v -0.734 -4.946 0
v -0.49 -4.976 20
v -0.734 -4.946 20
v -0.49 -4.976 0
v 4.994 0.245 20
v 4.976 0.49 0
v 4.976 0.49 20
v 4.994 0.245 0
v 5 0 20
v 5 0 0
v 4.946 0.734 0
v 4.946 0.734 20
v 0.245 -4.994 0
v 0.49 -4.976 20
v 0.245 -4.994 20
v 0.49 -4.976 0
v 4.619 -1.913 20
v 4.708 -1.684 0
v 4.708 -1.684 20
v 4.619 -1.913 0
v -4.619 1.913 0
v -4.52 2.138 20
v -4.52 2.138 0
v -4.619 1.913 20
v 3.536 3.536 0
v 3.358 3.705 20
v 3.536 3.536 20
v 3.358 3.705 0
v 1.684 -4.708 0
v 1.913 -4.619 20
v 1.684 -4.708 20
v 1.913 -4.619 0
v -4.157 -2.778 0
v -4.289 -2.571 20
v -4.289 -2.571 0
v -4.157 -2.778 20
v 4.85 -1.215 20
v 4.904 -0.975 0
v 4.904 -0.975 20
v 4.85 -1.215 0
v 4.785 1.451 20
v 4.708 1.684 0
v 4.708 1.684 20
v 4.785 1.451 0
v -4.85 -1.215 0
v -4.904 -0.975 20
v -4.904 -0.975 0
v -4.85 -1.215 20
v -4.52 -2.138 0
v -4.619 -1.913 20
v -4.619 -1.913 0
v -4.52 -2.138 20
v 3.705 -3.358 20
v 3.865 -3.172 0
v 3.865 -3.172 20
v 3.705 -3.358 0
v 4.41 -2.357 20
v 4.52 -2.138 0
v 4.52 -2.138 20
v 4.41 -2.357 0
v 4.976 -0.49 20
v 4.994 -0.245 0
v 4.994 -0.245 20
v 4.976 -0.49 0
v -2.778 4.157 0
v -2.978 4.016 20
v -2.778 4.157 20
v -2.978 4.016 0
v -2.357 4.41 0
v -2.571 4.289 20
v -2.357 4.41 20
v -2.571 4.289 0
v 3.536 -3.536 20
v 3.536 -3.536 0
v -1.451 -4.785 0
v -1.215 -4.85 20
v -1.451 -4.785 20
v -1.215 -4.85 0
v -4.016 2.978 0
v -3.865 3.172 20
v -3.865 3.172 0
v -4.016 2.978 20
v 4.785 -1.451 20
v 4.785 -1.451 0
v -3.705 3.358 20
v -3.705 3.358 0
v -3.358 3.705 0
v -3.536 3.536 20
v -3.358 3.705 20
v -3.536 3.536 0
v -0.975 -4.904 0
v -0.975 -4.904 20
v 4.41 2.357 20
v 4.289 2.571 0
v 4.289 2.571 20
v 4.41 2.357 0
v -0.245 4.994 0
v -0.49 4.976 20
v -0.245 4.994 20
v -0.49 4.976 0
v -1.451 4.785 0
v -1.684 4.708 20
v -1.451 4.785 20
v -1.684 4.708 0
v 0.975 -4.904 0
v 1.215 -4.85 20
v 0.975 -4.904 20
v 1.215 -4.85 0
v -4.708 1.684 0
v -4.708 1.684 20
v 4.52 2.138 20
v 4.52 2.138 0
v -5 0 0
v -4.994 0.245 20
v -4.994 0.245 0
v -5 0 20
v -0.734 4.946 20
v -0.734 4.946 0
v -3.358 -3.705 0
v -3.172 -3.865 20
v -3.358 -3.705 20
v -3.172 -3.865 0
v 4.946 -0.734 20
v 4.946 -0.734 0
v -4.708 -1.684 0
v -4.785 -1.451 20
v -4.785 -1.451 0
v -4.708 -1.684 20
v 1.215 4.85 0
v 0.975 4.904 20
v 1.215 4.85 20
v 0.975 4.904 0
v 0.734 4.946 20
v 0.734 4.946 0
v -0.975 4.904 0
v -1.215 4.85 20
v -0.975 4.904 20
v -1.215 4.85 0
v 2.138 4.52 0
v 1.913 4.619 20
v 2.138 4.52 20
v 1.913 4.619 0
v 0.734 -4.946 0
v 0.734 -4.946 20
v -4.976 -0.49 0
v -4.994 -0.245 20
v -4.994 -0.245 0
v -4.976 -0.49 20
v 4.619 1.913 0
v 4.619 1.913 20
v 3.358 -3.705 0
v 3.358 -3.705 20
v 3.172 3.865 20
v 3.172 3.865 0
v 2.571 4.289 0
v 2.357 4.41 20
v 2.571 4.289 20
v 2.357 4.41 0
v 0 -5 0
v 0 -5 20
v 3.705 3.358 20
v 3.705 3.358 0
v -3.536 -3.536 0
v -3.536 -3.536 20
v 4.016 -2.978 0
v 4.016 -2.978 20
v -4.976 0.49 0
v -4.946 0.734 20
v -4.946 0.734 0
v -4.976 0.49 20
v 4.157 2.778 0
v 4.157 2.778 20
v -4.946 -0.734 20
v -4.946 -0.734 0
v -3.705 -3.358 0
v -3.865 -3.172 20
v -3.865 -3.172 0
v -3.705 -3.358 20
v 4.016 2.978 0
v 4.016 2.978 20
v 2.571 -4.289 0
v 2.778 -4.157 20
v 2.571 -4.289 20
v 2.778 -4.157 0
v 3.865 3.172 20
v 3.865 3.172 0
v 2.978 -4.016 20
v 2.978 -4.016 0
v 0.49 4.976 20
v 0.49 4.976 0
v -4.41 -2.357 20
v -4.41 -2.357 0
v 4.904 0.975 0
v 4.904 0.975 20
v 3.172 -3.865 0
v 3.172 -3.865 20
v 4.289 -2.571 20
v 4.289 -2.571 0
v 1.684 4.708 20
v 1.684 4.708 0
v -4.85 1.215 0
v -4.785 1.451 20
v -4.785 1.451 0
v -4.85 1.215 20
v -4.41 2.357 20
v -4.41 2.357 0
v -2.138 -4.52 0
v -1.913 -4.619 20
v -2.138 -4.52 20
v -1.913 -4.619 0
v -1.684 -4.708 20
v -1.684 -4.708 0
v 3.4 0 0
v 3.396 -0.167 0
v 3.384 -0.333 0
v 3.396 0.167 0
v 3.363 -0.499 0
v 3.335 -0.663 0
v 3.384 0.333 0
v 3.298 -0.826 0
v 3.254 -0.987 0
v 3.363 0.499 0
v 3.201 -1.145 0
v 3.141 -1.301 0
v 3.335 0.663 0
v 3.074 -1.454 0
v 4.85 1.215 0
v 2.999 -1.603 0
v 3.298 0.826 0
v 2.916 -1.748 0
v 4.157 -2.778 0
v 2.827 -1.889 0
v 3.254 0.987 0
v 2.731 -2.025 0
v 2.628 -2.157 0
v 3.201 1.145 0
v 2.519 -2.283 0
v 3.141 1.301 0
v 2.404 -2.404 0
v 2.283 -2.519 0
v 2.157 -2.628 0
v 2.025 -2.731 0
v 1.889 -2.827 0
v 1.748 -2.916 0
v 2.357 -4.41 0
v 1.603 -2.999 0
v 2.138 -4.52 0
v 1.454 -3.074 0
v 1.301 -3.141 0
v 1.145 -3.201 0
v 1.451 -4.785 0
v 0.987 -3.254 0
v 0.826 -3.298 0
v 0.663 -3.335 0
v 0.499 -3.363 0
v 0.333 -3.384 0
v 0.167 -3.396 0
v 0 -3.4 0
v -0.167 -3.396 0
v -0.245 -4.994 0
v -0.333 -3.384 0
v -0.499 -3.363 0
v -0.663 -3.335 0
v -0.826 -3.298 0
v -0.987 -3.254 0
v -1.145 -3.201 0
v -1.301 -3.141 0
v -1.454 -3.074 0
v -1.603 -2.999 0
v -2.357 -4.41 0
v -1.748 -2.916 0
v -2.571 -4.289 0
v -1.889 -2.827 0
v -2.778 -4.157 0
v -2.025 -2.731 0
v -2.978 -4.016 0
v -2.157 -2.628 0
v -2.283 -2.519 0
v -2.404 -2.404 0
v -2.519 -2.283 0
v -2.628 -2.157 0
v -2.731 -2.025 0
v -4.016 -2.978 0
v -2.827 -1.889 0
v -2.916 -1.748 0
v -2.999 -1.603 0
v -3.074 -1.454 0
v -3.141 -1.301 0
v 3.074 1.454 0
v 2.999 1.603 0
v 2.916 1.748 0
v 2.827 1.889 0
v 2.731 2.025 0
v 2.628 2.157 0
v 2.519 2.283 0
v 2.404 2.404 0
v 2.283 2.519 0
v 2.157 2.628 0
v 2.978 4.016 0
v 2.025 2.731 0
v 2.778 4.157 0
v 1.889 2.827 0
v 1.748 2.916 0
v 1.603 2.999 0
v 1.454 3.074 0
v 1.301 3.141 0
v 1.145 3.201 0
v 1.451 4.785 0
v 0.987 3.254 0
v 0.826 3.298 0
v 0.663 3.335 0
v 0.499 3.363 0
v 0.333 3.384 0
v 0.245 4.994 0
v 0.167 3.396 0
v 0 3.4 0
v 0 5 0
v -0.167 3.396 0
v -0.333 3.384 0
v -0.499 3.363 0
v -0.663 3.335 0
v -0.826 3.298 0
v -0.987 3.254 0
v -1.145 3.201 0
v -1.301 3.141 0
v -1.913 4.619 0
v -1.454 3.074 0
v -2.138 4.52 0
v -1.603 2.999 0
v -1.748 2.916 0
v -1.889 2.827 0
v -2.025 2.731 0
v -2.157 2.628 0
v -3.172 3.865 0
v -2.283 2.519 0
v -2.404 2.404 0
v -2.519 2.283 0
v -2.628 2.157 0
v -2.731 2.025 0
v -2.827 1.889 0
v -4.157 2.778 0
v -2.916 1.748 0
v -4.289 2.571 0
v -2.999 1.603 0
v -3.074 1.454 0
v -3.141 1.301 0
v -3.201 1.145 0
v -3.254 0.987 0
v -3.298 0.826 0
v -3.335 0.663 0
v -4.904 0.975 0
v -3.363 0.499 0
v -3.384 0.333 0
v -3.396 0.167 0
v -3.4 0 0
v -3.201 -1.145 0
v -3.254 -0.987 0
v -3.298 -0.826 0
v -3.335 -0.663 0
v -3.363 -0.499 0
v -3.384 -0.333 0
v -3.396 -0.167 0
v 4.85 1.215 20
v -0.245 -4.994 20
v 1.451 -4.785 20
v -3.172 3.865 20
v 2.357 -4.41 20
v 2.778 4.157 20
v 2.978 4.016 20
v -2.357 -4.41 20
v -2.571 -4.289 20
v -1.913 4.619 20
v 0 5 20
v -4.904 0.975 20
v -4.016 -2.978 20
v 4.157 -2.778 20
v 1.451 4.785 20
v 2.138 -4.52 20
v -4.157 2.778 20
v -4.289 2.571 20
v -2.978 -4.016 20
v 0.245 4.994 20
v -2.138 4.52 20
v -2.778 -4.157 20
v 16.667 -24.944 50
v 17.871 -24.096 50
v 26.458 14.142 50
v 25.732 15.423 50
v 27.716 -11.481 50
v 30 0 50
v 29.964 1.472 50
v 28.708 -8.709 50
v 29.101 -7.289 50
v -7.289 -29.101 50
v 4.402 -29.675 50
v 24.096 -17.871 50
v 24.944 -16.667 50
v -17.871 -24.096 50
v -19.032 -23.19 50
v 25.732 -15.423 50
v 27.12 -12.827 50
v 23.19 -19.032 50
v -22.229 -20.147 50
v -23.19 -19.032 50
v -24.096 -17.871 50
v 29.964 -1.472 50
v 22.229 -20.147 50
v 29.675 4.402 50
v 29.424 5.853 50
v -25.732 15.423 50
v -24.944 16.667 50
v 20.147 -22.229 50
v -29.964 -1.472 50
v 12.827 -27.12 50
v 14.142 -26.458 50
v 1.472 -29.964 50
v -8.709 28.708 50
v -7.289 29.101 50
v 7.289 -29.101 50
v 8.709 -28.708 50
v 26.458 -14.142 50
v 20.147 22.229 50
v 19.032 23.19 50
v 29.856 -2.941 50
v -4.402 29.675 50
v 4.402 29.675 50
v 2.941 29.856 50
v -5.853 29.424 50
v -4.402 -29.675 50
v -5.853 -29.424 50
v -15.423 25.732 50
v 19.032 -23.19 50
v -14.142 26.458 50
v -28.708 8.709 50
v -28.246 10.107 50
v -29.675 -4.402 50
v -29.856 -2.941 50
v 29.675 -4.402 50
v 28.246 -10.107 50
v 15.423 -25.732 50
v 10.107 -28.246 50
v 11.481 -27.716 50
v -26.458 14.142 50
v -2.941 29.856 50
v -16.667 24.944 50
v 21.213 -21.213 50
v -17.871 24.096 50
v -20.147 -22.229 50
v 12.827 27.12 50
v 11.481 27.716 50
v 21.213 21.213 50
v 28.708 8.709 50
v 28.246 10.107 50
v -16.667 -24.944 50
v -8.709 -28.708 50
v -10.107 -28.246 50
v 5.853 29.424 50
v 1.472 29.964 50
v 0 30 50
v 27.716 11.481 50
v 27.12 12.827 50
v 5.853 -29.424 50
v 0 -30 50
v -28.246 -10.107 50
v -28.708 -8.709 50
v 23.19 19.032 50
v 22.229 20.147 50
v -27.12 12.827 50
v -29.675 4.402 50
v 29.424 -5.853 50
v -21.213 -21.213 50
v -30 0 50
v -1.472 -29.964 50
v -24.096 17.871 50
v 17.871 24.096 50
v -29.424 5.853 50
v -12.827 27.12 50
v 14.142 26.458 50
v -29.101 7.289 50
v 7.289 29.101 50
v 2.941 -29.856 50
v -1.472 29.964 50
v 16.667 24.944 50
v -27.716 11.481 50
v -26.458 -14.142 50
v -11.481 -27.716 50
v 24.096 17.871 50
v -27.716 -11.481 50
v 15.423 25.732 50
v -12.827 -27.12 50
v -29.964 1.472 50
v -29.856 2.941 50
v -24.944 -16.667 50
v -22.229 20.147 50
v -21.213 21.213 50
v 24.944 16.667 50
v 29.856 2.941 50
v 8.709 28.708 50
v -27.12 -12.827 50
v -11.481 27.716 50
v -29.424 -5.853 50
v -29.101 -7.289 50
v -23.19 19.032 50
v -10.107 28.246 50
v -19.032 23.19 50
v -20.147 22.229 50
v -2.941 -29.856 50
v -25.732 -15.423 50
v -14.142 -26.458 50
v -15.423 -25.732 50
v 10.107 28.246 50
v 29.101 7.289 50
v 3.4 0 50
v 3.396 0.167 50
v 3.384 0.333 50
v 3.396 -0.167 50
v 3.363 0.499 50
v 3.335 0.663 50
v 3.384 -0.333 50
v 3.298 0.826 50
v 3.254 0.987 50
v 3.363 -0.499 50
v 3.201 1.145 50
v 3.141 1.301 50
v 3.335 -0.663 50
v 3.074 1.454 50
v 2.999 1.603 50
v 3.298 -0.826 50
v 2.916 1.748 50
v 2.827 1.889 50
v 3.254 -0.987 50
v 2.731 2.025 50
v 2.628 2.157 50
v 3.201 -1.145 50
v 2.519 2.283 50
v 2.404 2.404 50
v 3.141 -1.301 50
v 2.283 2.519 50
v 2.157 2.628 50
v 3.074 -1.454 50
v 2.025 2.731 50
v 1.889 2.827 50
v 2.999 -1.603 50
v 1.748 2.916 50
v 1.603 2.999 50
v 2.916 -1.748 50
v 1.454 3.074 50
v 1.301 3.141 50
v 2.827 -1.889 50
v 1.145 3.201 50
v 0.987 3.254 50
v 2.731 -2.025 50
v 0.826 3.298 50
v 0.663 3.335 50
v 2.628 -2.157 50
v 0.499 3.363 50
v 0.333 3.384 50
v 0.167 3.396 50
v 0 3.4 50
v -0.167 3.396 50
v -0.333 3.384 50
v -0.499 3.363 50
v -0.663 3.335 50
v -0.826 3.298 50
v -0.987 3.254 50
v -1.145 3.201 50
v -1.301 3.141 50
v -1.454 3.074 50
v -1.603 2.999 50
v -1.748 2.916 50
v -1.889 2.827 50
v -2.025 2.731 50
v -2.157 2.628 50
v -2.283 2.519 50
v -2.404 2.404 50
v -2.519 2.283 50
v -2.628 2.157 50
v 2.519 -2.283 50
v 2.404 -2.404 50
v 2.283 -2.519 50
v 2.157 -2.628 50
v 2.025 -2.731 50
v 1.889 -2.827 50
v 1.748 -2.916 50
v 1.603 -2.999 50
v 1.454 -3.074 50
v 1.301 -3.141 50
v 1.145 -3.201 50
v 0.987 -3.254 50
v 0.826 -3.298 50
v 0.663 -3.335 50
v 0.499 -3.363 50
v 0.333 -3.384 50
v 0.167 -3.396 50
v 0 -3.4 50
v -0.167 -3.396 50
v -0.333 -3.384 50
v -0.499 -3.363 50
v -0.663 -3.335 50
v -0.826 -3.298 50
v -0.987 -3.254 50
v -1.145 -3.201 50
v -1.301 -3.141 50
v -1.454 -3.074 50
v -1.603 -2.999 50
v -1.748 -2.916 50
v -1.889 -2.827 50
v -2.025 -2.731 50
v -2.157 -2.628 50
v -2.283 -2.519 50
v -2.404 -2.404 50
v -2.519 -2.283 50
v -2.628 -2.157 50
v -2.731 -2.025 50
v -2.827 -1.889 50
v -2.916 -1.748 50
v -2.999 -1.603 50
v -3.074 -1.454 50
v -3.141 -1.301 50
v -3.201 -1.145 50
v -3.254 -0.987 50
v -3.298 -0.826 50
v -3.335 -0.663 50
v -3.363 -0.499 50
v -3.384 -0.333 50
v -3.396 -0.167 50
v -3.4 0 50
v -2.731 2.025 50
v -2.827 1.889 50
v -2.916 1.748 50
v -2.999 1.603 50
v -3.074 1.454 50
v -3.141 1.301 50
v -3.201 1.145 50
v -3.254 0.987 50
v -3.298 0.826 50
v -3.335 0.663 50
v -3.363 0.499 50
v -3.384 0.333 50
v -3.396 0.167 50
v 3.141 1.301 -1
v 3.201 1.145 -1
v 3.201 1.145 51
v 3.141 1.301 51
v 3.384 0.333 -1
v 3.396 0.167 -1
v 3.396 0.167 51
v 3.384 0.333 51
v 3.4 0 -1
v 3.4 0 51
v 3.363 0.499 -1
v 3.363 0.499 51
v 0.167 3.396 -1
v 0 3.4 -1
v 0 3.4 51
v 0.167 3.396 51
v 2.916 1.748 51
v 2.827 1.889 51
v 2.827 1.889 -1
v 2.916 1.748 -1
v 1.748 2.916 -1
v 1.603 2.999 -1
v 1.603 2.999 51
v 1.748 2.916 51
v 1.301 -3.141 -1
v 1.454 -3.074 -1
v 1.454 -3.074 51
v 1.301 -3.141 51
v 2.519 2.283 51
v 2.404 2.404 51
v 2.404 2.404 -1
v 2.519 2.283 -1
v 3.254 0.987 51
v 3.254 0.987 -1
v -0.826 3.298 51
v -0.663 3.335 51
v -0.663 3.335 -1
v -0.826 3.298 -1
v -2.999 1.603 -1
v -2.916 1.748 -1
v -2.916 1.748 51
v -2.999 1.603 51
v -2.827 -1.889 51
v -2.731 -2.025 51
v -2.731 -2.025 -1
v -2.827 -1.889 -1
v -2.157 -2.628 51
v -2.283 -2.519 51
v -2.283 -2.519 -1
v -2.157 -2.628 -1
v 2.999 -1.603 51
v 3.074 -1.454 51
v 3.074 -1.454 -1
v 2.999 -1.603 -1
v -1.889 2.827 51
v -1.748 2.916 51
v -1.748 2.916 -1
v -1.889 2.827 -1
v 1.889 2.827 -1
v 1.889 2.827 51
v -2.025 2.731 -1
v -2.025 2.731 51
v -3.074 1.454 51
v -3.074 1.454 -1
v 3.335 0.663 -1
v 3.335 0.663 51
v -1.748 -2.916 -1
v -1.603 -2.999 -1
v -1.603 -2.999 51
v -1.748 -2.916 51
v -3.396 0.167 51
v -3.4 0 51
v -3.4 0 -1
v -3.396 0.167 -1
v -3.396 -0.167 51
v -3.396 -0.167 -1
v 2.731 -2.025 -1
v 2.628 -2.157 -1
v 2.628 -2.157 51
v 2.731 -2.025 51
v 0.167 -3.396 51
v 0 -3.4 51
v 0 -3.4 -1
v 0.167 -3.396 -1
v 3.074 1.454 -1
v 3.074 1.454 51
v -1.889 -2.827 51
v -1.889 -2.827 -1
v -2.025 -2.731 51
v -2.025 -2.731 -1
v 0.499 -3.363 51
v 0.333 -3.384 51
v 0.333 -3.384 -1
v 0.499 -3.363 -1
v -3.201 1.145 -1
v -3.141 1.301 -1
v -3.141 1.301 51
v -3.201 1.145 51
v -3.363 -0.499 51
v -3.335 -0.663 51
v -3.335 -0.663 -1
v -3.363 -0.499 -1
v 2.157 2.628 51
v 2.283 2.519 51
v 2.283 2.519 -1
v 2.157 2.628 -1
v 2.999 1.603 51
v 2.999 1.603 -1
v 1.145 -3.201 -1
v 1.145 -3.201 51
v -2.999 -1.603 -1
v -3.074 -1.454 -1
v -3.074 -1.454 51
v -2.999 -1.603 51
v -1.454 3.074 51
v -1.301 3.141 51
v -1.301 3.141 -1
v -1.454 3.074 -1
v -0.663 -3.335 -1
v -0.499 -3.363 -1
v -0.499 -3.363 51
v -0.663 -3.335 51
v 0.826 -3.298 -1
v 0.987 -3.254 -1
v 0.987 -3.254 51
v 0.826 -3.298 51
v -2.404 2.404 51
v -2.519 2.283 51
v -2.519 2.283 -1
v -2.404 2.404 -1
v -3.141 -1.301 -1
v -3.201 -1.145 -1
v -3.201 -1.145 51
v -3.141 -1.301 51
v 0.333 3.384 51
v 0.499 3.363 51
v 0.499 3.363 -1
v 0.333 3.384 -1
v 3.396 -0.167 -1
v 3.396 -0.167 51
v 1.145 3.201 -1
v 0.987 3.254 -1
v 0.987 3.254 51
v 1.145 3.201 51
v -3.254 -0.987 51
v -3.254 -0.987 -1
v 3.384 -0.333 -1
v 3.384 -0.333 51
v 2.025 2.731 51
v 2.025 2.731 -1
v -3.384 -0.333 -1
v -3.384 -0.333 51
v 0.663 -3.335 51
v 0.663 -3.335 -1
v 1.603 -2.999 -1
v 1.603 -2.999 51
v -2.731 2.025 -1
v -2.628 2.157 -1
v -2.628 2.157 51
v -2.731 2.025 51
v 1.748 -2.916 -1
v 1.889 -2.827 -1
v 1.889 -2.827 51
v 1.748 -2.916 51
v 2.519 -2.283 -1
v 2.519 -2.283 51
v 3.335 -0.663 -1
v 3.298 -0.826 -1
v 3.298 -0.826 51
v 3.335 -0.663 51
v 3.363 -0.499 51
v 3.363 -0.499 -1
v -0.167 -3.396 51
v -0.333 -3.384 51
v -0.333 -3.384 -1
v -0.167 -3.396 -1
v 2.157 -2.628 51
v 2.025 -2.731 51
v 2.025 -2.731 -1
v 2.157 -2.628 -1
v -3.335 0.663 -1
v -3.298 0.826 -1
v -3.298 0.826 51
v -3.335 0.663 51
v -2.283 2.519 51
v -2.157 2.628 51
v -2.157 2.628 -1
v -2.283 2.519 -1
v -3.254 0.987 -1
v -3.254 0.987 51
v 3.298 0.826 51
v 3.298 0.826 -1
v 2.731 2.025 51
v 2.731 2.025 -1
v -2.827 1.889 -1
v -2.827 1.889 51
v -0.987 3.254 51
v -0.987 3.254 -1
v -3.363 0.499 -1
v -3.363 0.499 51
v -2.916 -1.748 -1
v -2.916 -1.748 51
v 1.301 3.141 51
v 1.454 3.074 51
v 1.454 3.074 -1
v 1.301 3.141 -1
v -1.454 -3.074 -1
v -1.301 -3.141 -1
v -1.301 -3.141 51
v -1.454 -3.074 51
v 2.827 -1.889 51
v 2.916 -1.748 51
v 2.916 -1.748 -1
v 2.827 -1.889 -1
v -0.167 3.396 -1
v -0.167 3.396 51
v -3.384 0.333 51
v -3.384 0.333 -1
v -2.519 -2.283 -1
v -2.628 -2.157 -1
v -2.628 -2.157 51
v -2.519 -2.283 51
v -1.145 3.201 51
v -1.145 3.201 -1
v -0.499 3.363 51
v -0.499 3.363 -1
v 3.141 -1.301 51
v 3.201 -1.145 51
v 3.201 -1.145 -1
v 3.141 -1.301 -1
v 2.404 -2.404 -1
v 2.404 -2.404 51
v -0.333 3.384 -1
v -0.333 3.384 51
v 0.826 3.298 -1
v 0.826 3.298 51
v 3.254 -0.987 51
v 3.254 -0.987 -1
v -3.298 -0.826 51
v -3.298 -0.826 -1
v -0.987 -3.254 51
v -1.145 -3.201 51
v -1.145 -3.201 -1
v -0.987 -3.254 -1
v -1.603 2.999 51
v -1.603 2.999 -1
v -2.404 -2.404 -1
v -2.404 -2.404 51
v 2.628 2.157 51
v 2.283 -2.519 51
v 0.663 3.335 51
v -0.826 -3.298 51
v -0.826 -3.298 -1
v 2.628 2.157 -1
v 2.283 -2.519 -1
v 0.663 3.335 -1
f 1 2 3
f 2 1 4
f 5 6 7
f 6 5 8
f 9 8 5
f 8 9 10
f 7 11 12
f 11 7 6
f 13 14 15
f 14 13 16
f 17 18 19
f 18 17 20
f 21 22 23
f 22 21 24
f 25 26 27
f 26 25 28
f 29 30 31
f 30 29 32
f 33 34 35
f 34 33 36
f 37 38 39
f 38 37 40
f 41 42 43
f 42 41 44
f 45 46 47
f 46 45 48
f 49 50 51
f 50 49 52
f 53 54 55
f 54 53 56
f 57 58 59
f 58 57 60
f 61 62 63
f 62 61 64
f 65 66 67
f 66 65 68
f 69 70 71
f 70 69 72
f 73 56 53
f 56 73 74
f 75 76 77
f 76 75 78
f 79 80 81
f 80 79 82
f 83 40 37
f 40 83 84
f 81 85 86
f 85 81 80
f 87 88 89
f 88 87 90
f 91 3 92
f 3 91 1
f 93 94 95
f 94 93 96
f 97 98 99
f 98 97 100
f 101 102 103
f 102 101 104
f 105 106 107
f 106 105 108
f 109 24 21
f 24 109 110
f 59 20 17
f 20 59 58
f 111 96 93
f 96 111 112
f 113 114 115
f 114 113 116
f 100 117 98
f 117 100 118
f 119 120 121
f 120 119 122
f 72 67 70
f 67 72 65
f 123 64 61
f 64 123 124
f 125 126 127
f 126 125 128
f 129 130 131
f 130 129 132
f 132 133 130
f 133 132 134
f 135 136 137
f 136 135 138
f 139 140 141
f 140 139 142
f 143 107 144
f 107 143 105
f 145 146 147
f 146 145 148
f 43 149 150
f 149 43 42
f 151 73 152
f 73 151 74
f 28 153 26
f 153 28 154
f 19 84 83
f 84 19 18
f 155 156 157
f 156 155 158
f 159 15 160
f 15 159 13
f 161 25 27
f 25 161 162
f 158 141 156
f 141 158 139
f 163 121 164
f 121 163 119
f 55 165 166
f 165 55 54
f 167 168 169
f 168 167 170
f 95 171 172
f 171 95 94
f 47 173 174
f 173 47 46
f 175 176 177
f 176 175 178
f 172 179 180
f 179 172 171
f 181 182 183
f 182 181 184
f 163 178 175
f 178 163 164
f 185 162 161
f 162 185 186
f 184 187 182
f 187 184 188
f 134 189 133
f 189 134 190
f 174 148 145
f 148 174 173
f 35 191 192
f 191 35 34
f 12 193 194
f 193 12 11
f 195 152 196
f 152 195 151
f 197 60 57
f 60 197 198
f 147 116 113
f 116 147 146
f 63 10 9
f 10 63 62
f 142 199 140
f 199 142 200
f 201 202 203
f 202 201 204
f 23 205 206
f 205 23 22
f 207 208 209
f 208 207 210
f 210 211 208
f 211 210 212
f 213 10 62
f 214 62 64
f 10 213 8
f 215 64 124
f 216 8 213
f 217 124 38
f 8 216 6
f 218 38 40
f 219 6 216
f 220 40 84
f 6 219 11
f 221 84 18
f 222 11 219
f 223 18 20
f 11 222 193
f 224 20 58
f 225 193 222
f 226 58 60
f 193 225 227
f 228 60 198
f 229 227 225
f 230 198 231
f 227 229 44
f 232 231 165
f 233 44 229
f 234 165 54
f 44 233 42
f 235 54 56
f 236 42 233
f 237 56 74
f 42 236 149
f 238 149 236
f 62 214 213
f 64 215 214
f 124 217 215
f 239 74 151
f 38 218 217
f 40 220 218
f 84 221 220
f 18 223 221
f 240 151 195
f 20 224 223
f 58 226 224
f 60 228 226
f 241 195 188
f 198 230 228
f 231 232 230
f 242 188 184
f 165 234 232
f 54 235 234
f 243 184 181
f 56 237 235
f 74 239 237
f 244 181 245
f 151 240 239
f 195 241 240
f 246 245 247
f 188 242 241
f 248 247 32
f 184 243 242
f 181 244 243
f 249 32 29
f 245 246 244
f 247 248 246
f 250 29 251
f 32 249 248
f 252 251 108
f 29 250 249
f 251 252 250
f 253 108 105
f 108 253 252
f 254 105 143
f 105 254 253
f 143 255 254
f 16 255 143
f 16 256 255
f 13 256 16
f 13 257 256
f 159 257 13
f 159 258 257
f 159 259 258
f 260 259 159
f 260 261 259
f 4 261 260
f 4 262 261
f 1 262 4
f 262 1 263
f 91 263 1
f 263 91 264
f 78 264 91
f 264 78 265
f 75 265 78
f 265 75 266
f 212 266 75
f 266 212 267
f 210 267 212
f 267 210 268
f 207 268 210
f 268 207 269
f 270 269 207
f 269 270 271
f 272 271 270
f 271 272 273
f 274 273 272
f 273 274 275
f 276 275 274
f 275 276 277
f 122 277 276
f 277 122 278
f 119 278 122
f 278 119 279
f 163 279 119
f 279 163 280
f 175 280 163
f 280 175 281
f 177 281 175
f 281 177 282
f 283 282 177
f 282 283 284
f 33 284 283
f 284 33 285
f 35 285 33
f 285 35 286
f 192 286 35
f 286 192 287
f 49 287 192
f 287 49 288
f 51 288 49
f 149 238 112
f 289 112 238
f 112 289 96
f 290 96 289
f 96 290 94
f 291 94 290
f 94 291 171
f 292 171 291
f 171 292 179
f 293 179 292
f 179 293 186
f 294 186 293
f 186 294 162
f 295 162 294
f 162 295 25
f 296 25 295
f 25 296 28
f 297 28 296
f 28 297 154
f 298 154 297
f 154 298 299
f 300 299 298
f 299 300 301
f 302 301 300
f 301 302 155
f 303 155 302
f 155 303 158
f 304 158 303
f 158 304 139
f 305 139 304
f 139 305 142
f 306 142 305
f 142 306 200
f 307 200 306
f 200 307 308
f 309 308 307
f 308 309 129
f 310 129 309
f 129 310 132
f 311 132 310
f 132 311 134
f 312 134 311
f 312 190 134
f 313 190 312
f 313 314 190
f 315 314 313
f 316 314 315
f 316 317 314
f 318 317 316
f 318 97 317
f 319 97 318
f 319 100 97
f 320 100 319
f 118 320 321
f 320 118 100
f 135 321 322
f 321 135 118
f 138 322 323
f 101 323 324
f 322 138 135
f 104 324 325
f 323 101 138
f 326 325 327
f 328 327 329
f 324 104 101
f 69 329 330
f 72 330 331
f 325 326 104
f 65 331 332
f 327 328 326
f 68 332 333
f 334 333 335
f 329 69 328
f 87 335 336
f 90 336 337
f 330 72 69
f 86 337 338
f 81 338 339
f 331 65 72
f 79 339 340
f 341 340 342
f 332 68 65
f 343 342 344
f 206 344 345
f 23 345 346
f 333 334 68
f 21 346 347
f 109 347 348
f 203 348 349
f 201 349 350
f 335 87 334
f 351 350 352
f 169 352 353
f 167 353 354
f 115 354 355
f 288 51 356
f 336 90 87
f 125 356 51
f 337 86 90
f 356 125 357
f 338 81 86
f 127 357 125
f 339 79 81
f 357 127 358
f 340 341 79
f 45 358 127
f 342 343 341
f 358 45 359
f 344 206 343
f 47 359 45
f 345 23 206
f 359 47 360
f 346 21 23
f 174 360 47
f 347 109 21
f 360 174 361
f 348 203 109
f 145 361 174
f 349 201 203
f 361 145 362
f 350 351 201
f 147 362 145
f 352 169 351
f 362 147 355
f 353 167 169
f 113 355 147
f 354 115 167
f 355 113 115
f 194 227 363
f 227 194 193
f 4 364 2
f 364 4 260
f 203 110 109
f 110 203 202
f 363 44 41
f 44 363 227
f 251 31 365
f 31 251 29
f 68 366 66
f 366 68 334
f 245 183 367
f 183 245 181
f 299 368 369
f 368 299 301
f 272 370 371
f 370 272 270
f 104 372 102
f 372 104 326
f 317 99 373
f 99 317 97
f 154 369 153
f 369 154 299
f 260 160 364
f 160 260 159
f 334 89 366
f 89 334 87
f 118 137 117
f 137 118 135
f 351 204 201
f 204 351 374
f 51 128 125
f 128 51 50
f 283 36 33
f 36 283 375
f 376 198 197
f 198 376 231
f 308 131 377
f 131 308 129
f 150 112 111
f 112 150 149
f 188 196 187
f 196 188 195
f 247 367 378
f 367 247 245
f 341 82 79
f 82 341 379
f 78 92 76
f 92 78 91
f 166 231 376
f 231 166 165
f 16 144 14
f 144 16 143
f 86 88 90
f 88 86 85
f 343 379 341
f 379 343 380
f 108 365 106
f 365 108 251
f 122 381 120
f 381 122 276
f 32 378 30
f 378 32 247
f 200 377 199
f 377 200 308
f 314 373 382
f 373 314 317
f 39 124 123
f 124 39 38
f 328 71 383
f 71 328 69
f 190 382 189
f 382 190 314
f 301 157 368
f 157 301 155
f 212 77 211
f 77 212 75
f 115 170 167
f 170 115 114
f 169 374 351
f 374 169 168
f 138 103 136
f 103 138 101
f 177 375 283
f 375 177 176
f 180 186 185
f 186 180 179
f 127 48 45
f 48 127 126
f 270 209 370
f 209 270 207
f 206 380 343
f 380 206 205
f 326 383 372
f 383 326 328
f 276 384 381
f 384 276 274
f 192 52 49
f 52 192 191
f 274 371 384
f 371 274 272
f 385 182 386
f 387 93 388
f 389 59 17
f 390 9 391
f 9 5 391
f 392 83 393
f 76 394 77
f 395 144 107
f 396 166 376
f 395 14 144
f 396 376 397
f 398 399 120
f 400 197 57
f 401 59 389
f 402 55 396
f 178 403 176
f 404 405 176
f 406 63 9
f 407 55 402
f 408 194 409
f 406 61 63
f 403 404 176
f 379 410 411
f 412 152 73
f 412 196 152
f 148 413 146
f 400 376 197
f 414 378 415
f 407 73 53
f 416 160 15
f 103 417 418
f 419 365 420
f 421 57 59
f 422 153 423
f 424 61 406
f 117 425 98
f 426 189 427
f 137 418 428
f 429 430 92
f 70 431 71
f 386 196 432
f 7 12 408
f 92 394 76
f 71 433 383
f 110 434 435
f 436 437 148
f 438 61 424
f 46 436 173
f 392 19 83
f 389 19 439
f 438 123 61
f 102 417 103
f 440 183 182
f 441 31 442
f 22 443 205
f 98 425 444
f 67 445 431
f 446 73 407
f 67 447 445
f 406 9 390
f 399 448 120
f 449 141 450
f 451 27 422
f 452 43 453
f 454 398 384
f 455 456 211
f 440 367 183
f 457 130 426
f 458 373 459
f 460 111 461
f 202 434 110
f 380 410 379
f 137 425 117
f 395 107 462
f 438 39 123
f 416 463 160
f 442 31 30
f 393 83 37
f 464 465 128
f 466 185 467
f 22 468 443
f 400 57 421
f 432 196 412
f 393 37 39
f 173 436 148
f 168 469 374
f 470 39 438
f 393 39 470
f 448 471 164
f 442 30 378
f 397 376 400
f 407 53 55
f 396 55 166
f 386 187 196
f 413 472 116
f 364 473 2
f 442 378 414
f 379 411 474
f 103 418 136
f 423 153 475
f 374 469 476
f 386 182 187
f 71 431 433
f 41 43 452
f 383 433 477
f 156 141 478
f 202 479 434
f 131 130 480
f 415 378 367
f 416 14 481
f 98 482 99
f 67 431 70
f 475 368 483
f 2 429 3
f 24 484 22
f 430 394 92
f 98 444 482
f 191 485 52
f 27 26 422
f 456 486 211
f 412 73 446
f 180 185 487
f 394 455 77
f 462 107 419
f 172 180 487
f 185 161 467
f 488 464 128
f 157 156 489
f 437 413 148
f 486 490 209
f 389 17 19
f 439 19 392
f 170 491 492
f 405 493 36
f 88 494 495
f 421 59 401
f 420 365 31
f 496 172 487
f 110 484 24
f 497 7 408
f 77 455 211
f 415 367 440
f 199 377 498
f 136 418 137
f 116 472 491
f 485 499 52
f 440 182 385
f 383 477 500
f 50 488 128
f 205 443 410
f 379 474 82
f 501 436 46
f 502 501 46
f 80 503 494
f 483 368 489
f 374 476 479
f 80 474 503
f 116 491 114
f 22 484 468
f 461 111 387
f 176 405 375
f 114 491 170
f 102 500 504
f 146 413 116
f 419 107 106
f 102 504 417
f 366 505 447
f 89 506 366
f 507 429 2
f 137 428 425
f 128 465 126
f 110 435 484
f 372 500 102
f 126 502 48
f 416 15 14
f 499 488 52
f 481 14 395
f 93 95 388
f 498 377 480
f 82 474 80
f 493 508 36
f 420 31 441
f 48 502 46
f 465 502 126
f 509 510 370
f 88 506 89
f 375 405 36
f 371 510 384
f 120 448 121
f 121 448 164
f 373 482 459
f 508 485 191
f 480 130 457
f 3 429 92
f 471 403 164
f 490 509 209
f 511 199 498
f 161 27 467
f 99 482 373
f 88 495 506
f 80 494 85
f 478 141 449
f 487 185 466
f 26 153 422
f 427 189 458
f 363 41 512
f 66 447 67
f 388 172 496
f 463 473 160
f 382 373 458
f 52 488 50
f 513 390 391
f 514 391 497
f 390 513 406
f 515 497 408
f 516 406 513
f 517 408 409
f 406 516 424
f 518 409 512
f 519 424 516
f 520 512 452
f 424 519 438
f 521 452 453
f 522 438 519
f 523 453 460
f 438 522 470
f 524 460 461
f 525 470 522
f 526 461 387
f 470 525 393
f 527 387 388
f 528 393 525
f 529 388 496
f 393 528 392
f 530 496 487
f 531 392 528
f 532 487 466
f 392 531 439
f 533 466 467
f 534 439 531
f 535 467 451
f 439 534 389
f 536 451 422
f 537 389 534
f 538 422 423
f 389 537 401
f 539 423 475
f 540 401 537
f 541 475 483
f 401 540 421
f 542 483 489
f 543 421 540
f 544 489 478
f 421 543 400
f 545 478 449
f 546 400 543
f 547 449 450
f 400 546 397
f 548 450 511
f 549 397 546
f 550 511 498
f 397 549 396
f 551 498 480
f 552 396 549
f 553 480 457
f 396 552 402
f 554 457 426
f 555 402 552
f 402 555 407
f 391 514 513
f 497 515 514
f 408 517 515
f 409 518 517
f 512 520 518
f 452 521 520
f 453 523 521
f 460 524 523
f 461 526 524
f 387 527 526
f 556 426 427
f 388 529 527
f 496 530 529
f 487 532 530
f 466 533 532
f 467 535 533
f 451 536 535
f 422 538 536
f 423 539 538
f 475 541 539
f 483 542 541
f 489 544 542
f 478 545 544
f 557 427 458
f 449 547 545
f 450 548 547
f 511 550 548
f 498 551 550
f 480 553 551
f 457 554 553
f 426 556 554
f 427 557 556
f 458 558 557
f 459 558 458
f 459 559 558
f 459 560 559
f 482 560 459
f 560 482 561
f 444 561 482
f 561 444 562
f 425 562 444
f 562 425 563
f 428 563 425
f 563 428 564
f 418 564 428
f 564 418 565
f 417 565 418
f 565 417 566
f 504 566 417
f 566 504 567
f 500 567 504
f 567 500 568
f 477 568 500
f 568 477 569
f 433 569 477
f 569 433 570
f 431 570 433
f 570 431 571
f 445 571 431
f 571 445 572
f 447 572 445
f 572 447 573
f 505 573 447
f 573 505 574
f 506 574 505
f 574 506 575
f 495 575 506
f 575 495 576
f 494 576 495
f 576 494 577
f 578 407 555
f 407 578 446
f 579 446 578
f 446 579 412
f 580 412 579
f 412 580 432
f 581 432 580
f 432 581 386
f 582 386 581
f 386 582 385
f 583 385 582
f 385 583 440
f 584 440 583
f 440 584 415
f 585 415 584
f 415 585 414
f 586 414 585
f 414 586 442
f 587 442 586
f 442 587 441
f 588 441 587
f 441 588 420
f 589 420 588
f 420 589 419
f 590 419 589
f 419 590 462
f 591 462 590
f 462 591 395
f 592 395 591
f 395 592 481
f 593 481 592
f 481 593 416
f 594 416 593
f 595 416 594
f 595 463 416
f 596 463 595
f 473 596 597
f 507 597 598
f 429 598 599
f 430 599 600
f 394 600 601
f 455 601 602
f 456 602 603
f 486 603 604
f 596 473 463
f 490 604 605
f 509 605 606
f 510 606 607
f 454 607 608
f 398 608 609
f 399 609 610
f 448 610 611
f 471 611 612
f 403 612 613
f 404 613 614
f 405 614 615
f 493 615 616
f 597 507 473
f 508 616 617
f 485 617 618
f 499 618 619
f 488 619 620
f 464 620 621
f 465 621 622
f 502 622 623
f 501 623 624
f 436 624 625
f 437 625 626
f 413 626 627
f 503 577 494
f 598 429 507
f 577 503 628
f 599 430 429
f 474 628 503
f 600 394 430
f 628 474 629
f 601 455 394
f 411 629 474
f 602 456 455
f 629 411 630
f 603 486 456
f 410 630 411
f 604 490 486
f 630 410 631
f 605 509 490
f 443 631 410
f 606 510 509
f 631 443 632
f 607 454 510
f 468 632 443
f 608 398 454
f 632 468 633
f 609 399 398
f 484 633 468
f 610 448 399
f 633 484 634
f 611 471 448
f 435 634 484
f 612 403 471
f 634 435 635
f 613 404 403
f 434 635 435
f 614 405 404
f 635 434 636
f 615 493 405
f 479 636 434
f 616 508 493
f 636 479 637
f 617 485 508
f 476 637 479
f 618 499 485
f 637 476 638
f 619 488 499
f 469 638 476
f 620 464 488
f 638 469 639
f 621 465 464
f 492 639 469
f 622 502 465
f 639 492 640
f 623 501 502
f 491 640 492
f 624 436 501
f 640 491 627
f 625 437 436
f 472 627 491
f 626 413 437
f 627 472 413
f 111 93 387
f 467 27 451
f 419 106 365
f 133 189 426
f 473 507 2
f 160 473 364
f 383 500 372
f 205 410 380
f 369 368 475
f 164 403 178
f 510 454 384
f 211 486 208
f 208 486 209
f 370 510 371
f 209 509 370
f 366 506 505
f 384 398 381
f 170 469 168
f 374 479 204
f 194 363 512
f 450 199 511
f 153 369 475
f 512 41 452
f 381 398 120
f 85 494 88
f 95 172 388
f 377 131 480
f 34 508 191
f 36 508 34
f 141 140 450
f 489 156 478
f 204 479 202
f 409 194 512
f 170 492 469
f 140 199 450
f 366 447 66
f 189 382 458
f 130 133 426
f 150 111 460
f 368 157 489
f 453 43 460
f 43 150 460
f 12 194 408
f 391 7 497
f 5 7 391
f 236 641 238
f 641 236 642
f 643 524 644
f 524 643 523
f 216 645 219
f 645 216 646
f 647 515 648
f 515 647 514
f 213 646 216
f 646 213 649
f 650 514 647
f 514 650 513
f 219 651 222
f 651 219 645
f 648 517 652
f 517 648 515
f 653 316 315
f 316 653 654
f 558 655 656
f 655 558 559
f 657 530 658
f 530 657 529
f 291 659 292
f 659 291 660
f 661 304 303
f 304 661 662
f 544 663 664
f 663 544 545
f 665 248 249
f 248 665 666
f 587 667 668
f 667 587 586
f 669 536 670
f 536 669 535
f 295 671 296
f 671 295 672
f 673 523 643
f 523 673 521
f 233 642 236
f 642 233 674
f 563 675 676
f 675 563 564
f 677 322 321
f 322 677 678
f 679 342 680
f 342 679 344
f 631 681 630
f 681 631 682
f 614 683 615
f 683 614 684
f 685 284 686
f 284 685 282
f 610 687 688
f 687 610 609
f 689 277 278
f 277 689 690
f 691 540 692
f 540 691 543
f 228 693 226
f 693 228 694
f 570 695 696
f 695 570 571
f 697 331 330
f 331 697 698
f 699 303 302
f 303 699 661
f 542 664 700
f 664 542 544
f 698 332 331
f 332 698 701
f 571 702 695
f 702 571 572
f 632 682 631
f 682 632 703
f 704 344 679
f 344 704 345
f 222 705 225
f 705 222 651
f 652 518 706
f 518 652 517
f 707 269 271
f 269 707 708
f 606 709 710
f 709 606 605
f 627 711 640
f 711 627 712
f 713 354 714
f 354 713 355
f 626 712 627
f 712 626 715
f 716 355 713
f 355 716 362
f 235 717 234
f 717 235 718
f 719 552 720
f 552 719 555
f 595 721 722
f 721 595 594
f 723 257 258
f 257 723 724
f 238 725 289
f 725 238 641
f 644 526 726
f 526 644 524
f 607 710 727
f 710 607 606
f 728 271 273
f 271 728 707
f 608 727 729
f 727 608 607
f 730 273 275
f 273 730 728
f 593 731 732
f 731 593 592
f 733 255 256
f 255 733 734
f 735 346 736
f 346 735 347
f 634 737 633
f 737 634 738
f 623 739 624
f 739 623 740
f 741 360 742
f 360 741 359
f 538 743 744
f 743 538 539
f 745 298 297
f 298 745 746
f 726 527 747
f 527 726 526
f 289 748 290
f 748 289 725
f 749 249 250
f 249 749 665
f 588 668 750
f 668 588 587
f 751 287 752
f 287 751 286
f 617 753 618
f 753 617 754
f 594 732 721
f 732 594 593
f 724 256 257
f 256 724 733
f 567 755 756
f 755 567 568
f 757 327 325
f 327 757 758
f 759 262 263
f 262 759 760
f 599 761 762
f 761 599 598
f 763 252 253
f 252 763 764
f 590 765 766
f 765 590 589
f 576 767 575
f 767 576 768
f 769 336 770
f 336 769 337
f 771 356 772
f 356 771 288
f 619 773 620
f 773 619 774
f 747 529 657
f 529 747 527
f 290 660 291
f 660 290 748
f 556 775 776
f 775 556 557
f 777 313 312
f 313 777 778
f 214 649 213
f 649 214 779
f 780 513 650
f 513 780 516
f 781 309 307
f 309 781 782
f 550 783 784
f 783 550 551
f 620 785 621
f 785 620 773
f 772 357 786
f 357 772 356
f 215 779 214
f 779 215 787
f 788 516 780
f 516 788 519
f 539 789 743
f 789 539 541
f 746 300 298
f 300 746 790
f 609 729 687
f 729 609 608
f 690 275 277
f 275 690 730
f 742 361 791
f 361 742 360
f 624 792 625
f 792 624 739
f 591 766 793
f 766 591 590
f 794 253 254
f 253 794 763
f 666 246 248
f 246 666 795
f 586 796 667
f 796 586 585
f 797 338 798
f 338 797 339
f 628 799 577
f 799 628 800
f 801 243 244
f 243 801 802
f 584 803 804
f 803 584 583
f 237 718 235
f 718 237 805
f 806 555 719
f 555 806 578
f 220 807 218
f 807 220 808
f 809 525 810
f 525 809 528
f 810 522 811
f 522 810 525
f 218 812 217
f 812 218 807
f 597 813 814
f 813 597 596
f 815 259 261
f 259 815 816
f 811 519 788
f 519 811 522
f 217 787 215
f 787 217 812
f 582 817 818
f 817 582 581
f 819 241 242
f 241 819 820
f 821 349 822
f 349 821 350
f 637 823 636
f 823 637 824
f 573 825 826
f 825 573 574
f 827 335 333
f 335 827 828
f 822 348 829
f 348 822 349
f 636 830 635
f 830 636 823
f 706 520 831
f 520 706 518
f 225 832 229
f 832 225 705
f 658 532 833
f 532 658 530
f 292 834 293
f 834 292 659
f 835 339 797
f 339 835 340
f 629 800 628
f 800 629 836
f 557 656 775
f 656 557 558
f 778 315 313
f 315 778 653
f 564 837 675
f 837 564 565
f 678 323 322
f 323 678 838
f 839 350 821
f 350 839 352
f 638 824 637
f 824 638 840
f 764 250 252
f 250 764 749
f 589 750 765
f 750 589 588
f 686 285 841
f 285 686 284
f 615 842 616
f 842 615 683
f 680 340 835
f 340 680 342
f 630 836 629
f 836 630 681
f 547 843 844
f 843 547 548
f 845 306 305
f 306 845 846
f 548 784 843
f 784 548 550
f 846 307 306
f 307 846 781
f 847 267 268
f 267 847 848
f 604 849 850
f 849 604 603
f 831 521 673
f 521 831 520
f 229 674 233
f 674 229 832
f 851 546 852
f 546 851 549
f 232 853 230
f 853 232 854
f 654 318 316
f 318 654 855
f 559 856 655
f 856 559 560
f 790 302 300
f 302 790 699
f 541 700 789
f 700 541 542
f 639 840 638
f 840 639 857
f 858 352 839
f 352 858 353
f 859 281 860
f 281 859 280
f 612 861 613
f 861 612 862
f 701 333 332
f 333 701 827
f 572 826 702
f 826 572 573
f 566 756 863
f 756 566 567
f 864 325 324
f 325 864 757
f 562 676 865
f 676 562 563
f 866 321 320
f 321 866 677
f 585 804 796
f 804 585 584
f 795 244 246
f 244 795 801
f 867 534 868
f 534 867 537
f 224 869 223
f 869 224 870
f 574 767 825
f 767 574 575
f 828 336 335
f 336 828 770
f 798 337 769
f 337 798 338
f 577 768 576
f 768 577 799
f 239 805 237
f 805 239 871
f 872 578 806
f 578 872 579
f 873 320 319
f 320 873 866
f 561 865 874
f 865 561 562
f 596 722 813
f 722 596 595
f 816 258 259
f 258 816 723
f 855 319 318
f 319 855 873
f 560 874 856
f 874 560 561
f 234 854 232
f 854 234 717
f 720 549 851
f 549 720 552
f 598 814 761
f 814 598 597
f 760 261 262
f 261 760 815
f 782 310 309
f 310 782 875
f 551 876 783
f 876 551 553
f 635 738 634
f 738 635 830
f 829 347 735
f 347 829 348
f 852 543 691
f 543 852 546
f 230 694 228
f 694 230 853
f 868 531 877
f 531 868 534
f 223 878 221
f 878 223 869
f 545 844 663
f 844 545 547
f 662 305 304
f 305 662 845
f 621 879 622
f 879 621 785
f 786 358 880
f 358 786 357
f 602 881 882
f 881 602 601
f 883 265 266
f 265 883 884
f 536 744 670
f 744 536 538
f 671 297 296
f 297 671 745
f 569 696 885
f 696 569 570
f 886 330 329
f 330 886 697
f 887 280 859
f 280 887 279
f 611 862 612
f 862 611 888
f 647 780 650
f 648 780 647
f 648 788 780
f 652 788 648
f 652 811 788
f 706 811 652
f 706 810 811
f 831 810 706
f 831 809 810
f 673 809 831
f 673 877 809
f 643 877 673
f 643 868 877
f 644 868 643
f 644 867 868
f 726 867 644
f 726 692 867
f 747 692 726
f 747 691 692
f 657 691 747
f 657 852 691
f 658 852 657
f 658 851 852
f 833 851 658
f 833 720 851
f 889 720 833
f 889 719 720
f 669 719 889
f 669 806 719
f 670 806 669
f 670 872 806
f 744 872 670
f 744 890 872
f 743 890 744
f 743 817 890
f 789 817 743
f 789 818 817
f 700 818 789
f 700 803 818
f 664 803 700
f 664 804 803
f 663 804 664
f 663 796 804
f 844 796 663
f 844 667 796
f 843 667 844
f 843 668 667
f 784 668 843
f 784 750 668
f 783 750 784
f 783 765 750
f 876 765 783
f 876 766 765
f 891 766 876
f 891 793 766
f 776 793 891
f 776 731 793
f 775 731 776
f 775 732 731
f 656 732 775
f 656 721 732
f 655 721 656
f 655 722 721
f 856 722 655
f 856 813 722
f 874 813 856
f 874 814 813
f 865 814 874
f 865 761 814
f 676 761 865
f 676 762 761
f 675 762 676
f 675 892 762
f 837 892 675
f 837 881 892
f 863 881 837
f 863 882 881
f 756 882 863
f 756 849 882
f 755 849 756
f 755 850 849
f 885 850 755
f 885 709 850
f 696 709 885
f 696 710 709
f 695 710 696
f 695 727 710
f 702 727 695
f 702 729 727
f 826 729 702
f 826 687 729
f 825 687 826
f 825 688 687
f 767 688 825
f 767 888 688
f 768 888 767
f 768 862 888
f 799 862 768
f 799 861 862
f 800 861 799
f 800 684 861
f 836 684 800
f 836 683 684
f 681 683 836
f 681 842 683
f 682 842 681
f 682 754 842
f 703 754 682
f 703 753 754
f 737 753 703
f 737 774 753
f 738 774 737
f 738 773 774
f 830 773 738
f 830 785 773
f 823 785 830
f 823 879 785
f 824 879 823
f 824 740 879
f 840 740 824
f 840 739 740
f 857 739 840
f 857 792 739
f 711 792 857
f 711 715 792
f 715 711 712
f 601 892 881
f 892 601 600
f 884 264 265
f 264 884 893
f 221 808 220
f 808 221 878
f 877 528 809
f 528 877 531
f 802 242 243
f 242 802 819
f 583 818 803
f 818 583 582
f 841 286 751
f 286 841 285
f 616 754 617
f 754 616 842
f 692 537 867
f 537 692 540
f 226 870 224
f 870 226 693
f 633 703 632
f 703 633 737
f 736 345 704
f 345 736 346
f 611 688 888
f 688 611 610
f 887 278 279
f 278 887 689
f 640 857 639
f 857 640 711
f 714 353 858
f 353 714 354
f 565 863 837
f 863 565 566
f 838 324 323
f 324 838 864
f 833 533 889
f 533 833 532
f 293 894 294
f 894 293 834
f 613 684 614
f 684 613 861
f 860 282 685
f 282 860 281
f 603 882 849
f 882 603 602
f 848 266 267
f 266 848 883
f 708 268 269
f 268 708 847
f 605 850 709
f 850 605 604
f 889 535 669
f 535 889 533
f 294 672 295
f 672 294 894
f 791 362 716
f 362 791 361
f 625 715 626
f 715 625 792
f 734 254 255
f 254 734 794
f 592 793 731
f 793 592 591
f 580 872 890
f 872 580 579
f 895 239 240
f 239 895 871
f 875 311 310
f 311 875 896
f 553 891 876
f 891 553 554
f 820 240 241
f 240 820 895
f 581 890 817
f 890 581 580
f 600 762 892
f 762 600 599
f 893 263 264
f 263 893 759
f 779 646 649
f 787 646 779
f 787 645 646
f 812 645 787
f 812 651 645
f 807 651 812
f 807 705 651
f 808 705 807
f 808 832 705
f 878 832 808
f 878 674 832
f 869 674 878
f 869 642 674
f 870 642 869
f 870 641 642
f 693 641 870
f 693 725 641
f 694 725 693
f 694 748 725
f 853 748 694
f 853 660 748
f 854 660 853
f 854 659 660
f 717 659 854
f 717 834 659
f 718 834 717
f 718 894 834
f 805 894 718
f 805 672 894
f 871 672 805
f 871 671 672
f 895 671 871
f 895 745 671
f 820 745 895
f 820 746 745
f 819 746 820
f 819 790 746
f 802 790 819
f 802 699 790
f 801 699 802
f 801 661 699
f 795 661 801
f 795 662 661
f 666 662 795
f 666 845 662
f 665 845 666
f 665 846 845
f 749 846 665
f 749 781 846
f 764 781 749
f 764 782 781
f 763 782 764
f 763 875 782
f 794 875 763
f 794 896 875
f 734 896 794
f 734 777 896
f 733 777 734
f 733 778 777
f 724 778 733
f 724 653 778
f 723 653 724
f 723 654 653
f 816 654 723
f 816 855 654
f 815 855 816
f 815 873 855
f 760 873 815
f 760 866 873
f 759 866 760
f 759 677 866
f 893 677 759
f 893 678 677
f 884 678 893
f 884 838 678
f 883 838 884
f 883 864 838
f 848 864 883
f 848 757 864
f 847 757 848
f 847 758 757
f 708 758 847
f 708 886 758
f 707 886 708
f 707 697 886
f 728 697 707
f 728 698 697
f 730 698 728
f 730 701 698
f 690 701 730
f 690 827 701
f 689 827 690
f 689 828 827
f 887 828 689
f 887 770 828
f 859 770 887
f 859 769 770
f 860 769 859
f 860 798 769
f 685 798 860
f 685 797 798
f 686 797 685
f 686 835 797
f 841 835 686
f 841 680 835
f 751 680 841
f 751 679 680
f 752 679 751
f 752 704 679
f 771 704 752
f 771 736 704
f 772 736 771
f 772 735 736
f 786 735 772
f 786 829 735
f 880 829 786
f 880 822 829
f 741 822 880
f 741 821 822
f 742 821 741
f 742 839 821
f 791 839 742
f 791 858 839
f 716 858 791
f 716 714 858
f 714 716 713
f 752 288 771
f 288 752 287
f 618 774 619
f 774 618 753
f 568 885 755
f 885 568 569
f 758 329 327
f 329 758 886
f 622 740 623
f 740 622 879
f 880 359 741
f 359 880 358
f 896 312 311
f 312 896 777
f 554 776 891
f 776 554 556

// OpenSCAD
// Lab funnel - printed upright with wide opening at top
// Straight spout from z = 0 to z = 20, cone from z = 20 to z = 50

// ---- Dimensions (mm) ----
spout_od      = 10;    // spout outer diameter
spout_h       = 20;    // spout height (z = 0 to 20)
cone_od_top   = 60;    // cone outer diameter at rim (z = 50)
cone_od_bot   = 10;    // cone outer diameter at base (z = 20)
rim_h         = 30;    // cone height (z = 20 to 50)
wall          = 1.6;   // wall thickness everywhere

$fn = 128;

// ---- Derived ----
bore = spout_od - 2 * wall;   // 6.8 mm bore in spout

// ---- Model ----
union() {
    // Spout
    translate([0, 0, 0])
        cylinder(h = spout_h, d = spout_od);

    // Cone
    translate([0, 0, spout_h])
        cylinder(h = rim_h, d1 = cone_od_bot, d2 = cone_od_top);
}

// ---- Cut through bore (past both end faces) ----
translate([0, 0, -1])
    cylinder(h = spout_h + rim_h + 2, d = bore);
